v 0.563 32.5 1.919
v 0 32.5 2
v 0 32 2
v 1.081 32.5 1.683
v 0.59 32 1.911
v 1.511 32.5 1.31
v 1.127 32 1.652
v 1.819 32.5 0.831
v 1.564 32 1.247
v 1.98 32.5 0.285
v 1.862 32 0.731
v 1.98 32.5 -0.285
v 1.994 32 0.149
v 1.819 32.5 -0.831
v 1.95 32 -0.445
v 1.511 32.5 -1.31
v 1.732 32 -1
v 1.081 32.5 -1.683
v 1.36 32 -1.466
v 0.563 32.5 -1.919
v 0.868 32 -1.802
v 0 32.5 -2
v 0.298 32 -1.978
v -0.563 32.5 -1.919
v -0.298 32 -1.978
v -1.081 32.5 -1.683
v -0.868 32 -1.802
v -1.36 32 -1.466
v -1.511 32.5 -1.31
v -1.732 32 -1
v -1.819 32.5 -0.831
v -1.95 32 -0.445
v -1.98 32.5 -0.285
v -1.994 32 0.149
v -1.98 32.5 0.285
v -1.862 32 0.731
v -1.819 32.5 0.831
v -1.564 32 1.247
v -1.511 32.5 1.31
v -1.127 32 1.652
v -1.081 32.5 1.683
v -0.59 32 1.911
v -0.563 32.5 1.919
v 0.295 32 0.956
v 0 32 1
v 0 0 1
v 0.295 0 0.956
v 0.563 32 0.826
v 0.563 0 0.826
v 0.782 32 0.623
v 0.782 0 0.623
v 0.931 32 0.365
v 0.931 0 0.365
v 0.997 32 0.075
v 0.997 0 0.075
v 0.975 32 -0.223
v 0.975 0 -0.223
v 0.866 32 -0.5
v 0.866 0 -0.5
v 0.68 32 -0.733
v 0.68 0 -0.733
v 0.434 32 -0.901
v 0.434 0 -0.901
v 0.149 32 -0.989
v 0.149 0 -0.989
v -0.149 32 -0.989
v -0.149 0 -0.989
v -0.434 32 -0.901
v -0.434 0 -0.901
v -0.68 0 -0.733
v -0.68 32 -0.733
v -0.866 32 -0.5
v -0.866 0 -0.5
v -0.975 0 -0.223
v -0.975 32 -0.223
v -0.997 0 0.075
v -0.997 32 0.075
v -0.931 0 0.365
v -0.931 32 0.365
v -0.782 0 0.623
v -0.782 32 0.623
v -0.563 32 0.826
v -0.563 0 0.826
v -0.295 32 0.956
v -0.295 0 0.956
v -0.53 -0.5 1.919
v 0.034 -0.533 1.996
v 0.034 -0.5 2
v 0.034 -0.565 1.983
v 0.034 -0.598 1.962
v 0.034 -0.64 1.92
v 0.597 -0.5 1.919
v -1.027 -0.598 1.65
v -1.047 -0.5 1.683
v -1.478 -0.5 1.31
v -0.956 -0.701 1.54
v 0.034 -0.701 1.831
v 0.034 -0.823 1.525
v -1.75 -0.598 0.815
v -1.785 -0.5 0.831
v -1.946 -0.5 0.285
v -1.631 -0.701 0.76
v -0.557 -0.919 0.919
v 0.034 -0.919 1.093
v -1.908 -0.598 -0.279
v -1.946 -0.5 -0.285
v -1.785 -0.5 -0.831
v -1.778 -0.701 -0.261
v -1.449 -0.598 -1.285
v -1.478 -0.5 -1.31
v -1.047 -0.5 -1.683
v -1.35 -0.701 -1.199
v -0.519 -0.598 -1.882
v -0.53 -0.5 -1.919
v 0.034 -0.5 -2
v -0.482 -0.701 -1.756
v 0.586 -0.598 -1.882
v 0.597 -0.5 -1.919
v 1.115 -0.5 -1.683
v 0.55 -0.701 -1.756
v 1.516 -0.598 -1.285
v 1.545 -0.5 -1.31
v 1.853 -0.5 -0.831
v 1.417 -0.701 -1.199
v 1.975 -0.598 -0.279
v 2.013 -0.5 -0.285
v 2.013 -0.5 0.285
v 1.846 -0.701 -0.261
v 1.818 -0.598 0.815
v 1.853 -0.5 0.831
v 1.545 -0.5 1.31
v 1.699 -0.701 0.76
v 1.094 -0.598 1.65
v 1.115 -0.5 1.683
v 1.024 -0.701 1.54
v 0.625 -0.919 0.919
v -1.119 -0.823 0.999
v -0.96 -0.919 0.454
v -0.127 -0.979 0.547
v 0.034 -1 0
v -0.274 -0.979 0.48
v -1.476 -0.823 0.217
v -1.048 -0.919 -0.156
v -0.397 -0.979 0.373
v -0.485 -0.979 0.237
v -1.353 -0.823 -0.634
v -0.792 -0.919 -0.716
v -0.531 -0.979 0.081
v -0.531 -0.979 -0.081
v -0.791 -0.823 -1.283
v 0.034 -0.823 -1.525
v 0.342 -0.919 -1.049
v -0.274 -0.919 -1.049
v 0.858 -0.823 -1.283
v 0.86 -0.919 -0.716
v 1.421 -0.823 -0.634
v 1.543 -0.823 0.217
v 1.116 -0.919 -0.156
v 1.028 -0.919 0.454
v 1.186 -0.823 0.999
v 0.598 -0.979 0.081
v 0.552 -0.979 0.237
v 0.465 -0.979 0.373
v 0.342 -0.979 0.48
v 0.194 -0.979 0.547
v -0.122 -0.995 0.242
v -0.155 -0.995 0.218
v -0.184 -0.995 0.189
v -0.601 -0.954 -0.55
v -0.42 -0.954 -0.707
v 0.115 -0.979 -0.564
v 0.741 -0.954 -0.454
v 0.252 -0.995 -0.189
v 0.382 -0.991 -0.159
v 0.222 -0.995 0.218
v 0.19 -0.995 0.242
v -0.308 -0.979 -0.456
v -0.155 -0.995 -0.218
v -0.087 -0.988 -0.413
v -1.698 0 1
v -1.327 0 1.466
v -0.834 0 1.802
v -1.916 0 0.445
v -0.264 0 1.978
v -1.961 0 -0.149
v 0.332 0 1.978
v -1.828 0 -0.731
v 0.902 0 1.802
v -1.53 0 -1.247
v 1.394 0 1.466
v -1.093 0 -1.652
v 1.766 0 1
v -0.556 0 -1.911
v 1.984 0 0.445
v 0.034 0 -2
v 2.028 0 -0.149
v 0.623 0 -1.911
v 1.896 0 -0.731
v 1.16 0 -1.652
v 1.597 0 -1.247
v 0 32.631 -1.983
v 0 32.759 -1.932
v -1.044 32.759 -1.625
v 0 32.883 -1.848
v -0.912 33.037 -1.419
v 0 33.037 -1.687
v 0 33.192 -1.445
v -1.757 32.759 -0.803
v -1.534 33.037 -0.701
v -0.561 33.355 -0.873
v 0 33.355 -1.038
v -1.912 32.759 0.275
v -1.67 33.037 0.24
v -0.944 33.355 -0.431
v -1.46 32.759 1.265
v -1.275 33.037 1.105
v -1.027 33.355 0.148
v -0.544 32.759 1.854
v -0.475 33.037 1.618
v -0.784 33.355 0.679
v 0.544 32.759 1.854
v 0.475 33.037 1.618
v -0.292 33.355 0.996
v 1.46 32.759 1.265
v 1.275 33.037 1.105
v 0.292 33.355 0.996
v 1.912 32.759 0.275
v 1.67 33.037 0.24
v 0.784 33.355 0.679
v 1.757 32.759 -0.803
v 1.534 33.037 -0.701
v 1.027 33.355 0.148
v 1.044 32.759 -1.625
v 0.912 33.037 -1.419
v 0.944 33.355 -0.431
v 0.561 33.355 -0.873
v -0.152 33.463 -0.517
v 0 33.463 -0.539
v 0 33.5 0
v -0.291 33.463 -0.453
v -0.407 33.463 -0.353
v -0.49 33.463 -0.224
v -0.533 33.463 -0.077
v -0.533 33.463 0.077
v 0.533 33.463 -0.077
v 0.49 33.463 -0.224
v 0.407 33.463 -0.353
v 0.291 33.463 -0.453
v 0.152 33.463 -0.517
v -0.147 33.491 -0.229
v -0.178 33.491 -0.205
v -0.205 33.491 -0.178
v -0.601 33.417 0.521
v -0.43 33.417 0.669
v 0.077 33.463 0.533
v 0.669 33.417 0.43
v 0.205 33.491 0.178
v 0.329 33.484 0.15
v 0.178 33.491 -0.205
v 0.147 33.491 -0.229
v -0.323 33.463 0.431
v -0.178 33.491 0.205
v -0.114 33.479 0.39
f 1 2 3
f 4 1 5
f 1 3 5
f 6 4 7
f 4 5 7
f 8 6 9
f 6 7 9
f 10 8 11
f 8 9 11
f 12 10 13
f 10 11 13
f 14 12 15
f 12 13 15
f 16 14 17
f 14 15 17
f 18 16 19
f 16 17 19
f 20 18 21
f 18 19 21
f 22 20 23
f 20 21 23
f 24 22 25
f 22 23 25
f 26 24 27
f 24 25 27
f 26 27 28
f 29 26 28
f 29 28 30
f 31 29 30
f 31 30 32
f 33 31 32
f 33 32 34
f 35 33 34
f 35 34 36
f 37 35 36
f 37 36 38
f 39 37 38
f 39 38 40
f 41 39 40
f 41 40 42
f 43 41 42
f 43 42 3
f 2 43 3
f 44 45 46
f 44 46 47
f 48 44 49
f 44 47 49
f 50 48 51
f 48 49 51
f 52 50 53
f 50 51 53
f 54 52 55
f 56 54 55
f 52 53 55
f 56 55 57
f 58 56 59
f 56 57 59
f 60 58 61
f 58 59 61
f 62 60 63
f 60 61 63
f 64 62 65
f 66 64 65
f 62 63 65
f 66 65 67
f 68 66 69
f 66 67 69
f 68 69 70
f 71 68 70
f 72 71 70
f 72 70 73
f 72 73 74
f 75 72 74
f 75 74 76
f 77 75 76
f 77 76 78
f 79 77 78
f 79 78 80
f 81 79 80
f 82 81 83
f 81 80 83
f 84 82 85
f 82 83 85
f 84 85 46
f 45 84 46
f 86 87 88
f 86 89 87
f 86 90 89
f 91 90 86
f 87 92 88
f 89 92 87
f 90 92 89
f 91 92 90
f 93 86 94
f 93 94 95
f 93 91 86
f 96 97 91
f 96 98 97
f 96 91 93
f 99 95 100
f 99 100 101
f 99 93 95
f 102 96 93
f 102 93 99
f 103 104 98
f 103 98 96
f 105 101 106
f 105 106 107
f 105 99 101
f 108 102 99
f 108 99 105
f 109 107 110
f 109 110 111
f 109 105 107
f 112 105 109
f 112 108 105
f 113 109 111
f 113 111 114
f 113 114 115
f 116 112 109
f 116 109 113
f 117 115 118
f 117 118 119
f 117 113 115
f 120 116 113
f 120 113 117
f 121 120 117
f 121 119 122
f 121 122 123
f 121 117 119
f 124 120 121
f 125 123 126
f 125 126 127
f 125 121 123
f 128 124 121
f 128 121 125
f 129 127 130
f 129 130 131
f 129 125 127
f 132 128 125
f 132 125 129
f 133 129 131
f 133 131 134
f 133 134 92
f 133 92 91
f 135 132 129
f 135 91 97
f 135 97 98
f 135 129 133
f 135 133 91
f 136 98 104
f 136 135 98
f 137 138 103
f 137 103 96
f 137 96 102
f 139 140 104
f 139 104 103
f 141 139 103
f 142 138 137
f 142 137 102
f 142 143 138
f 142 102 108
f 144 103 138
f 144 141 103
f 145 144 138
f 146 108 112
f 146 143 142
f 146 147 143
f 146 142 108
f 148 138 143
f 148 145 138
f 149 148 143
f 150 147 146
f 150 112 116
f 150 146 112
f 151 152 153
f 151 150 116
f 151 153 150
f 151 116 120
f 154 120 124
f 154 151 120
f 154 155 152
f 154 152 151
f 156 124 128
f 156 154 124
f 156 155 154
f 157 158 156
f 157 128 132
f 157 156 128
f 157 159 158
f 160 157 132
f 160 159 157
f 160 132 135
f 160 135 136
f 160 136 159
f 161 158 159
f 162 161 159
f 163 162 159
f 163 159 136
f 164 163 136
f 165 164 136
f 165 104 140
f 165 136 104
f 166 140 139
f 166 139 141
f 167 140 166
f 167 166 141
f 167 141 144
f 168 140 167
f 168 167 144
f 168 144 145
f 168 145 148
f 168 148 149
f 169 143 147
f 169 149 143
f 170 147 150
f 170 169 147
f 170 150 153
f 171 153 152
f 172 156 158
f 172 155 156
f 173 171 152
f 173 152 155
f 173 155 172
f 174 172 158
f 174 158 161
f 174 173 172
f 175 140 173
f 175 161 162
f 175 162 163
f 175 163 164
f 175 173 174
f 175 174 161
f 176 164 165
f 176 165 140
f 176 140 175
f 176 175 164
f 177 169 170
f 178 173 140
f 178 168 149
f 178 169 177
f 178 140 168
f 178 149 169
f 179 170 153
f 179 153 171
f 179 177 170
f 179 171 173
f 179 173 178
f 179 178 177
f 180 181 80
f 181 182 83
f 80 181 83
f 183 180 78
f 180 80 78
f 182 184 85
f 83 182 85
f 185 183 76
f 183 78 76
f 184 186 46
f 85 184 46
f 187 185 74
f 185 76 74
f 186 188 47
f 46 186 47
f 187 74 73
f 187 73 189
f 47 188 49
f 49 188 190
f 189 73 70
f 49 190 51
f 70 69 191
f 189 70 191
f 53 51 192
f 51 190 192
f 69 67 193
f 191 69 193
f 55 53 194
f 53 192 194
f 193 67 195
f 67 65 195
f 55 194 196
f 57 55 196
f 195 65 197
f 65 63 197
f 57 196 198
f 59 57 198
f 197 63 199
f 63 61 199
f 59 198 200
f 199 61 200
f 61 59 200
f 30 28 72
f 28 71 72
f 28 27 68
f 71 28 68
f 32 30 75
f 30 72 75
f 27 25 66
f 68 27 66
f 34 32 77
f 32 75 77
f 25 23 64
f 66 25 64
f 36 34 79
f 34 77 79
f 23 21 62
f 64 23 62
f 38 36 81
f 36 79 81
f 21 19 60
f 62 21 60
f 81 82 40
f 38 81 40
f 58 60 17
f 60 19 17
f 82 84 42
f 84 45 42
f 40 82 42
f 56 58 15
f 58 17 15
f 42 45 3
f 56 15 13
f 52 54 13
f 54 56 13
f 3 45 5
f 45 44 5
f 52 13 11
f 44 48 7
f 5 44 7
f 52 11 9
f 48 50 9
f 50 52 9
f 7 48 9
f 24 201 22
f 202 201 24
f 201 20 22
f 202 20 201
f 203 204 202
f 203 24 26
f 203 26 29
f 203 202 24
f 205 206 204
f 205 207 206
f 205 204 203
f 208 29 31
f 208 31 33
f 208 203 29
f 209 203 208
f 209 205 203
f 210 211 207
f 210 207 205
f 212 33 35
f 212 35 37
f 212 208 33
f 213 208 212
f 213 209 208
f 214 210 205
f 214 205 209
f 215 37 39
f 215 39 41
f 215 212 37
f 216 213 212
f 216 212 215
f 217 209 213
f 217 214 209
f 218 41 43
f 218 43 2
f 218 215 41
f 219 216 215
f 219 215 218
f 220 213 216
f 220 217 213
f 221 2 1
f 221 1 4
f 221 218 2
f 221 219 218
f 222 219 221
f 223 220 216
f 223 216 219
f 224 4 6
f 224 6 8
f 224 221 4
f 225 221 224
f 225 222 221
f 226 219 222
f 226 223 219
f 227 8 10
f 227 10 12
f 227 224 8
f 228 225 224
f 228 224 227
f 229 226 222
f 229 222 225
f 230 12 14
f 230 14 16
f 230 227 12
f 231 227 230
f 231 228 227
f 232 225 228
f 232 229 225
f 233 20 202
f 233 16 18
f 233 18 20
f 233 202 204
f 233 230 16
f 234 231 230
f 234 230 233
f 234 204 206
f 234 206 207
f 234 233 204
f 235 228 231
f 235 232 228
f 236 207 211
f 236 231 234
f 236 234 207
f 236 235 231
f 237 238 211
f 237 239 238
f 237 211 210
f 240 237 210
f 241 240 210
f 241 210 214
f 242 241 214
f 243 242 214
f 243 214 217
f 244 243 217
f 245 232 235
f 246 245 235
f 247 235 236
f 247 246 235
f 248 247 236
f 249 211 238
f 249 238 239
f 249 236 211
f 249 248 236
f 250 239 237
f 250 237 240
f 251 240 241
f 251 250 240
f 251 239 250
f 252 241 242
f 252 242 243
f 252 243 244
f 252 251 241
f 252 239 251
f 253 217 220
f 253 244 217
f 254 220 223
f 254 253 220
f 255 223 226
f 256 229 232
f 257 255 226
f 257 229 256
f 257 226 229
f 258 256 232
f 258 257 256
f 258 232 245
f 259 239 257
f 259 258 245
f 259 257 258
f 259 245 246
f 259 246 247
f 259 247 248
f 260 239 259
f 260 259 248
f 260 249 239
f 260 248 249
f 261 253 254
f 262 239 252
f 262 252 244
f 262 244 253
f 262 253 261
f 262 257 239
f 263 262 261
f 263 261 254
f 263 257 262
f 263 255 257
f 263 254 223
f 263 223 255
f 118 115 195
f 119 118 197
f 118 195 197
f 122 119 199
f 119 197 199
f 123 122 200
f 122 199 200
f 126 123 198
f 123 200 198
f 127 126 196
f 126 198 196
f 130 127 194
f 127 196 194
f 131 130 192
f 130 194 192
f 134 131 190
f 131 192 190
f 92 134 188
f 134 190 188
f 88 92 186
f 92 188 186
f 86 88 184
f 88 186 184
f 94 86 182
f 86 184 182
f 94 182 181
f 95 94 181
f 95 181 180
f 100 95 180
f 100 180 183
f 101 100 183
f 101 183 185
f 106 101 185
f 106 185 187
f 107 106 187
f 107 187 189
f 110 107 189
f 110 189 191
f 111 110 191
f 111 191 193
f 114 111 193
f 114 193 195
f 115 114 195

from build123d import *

# Parameters (mm, degrees)
SKETCH1_R                  = 1
MAIN_BODY_OF_SCREW_DEPTH   = 32
SKETCH2_R                  = 2
TOP_EXTRUDE_DEPTH          = 0.5
DOME_AT_TOP_FACE_RADIUS    = 2
DOME_AT_TOP_HEIGHT         = 1
SKETCH3_R                  = 2
BOTTOM_EXTRUDE_DEPTH       = 0.5
DOME_AT_BOTTOM_FACE_RADIUS = 2
DOME_AT_BOTTOM_HEIGHT      = 0.5


with BuildPart() as part:
    # Sketch1 → Main Body of Screw (new body)
    with BuildSketch(Plane(origin=(0, 0, 0), x_dir=(1, 0, 0), z_dir=(0, 1, 0))):
        Circle(SKETCH1_R)
    extrude(amount=MAIN_BODY_OF_SCREW_DEPTH)

    # Sketch2 → Top Extrude (add)
    with BuildSketch(Plane(origin=(0, 32, 0), x_dir=(1, 0, 0), z_dir=(0, 1, 0))):
        Circle(SKETCH2_R)
    extrude(amount=TOP_EXTRUDE_DEPTH)

    # Dome at Top: an elliptical dome of height H over a round flat face of radius A is half a spheroid: the quarter ellipse of half axes A and H revolved about the face's axis
    with BuildSketch(Plane((0, 32.5, 0), x_dir=(0, 0, -1), z_dir=(1, 0, 0)), mode=Mode.PRIVATE) as dome_at_top_quarter:
        Ellipse(DOME_AT_TOP_FACE_RADIUS, DOME_AT_TOP_HEIGHT)
        Rectangle(DOME_AT_TOP_FACE_RADIUS, DOME_AT_TOP_HEIGHT, align=(Align.MIN, Align.MIN), mode=Mode.INTERSECT)
    revolve(dome_at_top_quarter.sketch, axis=Axis((0, 32.5, 0), (0, 1, 0)))

    # Sketch3 → Bottom Extrude (add)
    with BuildSketch(Plane.XZ):
        with Locations((0.033817747, 0)):
            Circle(SKETCH3_R)
    extrude(amount=BOTTOM_EXTRUDE_DEPTH)

    # Dome at Bottom: an elliptical dome of height H over a round flat face of radius A is half a spheroid: the quarter ellipse of half axes A and H revolved about the face's axis
    with BuildSketch(Plane((0.033817747, -0.5, 0), x_dir=(0, 0, 1), z_dir=(1, 0, 0)), mode=Mode.PRIVATE) as dome_at_bottom_quarter:
        Ellipse(DOME_AT_BOTTOM_FACE_RADIUS, DOME_AT_BOTTOM_HEIGHT)
        Rectangle(DOME_AT_BOTTOM_FACE_RADIUS, DOME_AT_BOTTOM_HEIGHT, align=(Align.MIN, Align.MIN), mode=Mode.INTERSECT)
    revolve(dome_at_bottom_quarter.sketch, axis=Axis((0.033817747, -0.5, 0), (0, -1, 0)))


solid = part.part
